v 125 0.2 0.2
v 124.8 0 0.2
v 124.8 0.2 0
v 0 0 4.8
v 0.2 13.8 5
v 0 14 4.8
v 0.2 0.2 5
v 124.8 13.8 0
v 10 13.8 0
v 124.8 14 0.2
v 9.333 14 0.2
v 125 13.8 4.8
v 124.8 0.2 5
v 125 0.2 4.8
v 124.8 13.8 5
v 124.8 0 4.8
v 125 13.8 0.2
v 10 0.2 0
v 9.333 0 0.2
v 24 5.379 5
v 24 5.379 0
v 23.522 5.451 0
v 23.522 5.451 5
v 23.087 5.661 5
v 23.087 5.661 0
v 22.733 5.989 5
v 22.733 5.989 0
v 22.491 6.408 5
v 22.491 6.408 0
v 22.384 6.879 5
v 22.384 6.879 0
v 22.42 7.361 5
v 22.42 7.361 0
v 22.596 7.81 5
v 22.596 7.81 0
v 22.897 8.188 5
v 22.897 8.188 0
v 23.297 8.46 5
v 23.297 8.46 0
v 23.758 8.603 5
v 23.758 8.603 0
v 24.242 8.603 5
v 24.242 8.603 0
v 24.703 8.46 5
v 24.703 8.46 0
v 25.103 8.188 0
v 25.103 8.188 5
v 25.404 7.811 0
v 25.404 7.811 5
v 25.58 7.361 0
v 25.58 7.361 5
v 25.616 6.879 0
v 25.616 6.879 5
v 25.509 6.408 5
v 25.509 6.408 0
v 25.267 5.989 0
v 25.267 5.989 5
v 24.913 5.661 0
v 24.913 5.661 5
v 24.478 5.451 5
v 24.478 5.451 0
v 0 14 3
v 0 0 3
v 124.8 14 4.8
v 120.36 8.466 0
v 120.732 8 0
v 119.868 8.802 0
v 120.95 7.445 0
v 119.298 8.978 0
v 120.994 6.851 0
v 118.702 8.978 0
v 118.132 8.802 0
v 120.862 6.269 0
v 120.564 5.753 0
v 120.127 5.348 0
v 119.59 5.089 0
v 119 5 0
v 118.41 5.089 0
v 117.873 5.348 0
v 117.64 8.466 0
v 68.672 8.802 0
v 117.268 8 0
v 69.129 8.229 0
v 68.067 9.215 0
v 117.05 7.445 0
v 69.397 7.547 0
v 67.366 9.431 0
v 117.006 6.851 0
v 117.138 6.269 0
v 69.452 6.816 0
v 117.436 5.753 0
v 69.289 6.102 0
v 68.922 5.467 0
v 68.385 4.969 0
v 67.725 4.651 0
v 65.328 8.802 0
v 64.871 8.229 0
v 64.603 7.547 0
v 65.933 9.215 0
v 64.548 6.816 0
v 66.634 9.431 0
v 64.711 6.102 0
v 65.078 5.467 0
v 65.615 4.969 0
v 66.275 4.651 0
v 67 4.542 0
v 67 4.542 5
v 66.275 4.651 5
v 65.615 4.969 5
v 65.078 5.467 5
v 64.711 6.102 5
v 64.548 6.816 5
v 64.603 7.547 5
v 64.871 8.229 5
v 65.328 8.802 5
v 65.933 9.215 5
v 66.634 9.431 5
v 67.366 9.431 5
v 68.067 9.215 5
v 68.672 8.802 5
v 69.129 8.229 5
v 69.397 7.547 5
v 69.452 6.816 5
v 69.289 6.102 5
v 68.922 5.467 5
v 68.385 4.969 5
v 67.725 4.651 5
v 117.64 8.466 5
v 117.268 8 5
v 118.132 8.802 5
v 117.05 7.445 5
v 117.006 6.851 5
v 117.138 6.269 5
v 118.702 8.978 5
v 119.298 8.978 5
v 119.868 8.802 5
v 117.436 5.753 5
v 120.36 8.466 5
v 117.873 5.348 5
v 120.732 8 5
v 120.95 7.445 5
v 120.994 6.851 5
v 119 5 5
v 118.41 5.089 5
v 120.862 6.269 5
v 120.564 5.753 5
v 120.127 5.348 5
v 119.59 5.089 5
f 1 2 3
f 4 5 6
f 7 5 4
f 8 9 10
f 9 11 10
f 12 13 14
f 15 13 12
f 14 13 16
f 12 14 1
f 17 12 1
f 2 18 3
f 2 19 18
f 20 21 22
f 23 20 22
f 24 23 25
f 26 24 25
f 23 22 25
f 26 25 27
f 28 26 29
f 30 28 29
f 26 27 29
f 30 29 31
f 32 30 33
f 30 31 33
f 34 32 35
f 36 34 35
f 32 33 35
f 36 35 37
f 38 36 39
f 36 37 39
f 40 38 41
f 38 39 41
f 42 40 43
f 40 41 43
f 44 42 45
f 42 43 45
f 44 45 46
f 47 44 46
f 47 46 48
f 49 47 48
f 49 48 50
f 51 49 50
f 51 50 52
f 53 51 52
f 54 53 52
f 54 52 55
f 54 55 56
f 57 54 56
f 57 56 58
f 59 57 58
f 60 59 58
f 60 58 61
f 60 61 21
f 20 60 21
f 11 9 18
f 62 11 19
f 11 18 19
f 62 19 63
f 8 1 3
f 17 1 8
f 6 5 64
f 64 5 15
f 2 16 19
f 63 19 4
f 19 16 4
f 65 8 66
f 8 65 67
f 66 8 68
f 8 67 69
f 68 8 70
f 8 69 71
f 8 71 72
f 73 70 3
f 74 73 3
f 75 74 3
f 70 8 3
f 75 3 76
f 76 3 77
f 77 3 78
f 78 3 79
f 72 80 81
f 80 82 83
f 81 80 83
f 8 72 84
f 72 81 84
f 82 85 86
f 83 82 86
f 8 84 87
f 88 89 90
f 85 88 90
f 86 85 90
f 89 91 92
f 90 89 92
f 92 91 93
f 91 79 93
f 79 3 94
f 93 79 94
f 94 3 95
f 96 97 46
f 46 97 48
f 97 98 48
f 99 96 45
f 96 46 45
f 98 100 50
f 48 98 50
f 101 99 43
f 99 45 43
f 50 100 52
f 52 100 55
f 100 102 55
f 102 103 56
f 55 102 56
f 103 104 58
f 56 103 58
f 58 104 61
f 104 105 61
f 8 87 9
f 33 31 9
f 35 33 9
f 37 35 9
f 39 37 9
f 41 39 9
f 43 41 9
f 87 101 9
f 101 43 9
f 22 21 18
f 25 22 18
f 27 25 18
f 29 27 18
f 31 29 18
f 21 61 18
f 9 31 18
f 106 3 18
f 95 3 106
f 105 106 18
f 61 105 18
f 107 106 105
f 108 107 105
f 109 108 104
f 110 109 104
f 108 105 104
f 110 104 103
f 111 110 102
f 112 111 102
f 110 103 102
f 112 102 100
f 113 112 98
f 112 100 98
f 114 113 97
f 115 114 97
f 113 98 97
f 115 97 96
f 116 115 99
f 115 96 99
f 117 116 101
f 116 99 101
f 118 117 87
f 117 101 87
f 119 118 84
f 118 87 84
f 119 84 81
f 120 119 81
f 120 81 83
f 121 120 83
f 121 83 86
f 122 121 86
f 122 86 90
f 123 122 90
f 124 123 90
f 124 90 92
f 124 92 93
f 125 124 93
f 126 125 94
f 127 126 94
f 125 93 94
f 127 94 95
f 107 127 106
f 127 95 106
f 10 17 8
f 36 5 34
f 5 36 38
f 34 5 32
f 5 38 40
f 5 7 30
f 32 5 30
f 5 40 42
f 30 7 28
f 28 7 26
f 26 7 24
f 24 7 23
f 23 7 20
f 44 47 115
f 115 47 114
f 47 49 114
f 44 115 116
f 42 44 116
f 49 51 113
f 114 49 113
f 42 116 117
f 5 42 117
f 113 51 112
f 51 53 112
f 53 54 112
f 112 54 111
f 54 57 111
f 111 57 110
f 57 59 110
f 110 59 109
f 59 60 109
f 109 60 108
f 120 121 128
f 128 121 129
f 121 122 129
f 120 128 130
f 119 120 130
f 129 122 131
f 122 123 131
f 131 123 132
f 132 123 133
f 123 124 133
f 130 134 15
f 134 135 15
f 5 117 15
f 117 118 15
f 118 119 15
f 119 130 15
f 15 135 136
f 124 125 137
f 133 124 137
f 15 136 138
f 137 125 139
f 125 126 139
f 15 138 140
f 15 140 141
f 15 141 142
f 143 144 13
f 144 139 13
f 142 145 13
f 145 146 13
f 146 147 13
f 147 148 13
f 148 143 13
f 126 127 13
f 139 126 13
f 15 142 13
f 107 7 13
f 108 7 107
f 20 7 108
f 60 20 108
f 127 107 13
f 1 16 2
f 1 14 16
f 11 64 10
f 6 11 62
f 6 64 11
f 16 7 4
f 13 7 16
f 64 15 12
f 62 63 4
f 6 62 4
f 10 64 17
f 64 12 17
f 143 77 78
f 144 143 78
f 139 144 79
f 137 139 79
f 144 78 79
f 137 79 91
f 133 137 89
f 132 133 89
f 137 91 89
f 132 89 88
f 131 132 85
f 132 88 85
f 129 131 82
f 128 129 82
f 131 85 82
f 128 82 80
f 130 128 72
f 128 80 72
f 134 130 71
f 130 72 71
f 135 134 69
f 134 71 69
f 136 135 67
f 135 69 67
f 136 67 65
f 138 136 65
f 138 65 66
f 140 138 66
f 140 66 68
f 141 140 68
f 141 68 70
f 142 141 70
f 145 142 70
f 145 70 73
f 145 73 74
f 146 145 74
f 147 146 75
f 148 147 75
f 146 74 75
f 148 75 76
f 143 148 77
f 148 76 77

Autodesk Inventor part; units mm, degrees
ref_plane "YZ Plane" through (0, 0, 0) normal (1, 0, 0) x (0, 1, 0)
ref_plane "XZ Plane" through (0, 0, 0) normal (0, 1, 0) x (-1, 0, 0)
ref_plane "XY Plane" through (0, 0, 0) normal (0, 0, 1) x (1, 0, 0)
sketch "Skizze1" plane through (0, 0, 0) normal (0, 1, 0) x (-1, 0, 0)
  line L0 (0, 3) -> (0, 5)
  line L1 (0, 5) -> (-125, 5)
  line L2 (-125, 5) -> (-125, 0)
  line L3 (-125, 0) -> (-10, 0)
  line L4 (-10, 0) -> (0, 3)
  point P0 (0, 0)
  dimension "d0" = 10
  dimension "d1" = 2
  dimension "d2" = 125
  dimension "d3" = 5
extrude "Extrusion1" add sketch "Skizze1" along normal blind 14
sketch "Skizze2" plane through (0, 0, 5) normal (0, 0, 1) x (1, 0, 0)
  line L0 (0, 0) -> (0, 14) projected
  point P0 (24, 7)
  point P1 (0, 7)
  dimension "d13" = 24
hole "Bohrung1" at (24, 7, 5) direction (0, 0, -1) diameter 3.242 depth 5 thread size "M4x0.7" class "6H" standard "ISO Metric profile"
sketch "Skizze3" plane through (0, 0, 5) normal (0, 0, 1) x (1, 0, 0)
  circle A0 centre (24, 7) radius 1.621 projected
  line L0 (0, 0) -> (0, 14) projected
  point P0 (67, 7)
  point P1 (0, 7)
  dimension "d21" = 43
hole "Bohrung2" at (67, 7, 5) direction (0, 0, -1) diameter 4.917 end through all thread size "M6x1" class "6H" standard "ISO Metric profile"
sketch "Skizze4" plane through (0, 0, 5) normal (0, 0, 1) x (1, 0, 0)
  line L0 (0, 0) -> (0, 14) projected
  circle A0 centre (67, 7) radius 2.4585 projected
  line L1 (125, 0) -> (125, 14) projected
  point P0 (119, 7)
  point P1 (0, 7)
  point P2 (125, 7)
  dimension "d29" = 52
  dimension "d30" = 6
hole "Bohrung3" at (119, 7, 5) direction (0, 0, -1) diameter 4 end through all
chamfer "Fasen1" distance 0.2 angle 45 9 edges at (62.5, 0, 5) (62.5, 14, 5) (125, 7, 5) (125, 0, 2.5) (67.5, 0, 0) (125, 7, 0) (125, 14, 2.5) (67.5, 14, 0) (0, 7, 5)
properties part number "112"
